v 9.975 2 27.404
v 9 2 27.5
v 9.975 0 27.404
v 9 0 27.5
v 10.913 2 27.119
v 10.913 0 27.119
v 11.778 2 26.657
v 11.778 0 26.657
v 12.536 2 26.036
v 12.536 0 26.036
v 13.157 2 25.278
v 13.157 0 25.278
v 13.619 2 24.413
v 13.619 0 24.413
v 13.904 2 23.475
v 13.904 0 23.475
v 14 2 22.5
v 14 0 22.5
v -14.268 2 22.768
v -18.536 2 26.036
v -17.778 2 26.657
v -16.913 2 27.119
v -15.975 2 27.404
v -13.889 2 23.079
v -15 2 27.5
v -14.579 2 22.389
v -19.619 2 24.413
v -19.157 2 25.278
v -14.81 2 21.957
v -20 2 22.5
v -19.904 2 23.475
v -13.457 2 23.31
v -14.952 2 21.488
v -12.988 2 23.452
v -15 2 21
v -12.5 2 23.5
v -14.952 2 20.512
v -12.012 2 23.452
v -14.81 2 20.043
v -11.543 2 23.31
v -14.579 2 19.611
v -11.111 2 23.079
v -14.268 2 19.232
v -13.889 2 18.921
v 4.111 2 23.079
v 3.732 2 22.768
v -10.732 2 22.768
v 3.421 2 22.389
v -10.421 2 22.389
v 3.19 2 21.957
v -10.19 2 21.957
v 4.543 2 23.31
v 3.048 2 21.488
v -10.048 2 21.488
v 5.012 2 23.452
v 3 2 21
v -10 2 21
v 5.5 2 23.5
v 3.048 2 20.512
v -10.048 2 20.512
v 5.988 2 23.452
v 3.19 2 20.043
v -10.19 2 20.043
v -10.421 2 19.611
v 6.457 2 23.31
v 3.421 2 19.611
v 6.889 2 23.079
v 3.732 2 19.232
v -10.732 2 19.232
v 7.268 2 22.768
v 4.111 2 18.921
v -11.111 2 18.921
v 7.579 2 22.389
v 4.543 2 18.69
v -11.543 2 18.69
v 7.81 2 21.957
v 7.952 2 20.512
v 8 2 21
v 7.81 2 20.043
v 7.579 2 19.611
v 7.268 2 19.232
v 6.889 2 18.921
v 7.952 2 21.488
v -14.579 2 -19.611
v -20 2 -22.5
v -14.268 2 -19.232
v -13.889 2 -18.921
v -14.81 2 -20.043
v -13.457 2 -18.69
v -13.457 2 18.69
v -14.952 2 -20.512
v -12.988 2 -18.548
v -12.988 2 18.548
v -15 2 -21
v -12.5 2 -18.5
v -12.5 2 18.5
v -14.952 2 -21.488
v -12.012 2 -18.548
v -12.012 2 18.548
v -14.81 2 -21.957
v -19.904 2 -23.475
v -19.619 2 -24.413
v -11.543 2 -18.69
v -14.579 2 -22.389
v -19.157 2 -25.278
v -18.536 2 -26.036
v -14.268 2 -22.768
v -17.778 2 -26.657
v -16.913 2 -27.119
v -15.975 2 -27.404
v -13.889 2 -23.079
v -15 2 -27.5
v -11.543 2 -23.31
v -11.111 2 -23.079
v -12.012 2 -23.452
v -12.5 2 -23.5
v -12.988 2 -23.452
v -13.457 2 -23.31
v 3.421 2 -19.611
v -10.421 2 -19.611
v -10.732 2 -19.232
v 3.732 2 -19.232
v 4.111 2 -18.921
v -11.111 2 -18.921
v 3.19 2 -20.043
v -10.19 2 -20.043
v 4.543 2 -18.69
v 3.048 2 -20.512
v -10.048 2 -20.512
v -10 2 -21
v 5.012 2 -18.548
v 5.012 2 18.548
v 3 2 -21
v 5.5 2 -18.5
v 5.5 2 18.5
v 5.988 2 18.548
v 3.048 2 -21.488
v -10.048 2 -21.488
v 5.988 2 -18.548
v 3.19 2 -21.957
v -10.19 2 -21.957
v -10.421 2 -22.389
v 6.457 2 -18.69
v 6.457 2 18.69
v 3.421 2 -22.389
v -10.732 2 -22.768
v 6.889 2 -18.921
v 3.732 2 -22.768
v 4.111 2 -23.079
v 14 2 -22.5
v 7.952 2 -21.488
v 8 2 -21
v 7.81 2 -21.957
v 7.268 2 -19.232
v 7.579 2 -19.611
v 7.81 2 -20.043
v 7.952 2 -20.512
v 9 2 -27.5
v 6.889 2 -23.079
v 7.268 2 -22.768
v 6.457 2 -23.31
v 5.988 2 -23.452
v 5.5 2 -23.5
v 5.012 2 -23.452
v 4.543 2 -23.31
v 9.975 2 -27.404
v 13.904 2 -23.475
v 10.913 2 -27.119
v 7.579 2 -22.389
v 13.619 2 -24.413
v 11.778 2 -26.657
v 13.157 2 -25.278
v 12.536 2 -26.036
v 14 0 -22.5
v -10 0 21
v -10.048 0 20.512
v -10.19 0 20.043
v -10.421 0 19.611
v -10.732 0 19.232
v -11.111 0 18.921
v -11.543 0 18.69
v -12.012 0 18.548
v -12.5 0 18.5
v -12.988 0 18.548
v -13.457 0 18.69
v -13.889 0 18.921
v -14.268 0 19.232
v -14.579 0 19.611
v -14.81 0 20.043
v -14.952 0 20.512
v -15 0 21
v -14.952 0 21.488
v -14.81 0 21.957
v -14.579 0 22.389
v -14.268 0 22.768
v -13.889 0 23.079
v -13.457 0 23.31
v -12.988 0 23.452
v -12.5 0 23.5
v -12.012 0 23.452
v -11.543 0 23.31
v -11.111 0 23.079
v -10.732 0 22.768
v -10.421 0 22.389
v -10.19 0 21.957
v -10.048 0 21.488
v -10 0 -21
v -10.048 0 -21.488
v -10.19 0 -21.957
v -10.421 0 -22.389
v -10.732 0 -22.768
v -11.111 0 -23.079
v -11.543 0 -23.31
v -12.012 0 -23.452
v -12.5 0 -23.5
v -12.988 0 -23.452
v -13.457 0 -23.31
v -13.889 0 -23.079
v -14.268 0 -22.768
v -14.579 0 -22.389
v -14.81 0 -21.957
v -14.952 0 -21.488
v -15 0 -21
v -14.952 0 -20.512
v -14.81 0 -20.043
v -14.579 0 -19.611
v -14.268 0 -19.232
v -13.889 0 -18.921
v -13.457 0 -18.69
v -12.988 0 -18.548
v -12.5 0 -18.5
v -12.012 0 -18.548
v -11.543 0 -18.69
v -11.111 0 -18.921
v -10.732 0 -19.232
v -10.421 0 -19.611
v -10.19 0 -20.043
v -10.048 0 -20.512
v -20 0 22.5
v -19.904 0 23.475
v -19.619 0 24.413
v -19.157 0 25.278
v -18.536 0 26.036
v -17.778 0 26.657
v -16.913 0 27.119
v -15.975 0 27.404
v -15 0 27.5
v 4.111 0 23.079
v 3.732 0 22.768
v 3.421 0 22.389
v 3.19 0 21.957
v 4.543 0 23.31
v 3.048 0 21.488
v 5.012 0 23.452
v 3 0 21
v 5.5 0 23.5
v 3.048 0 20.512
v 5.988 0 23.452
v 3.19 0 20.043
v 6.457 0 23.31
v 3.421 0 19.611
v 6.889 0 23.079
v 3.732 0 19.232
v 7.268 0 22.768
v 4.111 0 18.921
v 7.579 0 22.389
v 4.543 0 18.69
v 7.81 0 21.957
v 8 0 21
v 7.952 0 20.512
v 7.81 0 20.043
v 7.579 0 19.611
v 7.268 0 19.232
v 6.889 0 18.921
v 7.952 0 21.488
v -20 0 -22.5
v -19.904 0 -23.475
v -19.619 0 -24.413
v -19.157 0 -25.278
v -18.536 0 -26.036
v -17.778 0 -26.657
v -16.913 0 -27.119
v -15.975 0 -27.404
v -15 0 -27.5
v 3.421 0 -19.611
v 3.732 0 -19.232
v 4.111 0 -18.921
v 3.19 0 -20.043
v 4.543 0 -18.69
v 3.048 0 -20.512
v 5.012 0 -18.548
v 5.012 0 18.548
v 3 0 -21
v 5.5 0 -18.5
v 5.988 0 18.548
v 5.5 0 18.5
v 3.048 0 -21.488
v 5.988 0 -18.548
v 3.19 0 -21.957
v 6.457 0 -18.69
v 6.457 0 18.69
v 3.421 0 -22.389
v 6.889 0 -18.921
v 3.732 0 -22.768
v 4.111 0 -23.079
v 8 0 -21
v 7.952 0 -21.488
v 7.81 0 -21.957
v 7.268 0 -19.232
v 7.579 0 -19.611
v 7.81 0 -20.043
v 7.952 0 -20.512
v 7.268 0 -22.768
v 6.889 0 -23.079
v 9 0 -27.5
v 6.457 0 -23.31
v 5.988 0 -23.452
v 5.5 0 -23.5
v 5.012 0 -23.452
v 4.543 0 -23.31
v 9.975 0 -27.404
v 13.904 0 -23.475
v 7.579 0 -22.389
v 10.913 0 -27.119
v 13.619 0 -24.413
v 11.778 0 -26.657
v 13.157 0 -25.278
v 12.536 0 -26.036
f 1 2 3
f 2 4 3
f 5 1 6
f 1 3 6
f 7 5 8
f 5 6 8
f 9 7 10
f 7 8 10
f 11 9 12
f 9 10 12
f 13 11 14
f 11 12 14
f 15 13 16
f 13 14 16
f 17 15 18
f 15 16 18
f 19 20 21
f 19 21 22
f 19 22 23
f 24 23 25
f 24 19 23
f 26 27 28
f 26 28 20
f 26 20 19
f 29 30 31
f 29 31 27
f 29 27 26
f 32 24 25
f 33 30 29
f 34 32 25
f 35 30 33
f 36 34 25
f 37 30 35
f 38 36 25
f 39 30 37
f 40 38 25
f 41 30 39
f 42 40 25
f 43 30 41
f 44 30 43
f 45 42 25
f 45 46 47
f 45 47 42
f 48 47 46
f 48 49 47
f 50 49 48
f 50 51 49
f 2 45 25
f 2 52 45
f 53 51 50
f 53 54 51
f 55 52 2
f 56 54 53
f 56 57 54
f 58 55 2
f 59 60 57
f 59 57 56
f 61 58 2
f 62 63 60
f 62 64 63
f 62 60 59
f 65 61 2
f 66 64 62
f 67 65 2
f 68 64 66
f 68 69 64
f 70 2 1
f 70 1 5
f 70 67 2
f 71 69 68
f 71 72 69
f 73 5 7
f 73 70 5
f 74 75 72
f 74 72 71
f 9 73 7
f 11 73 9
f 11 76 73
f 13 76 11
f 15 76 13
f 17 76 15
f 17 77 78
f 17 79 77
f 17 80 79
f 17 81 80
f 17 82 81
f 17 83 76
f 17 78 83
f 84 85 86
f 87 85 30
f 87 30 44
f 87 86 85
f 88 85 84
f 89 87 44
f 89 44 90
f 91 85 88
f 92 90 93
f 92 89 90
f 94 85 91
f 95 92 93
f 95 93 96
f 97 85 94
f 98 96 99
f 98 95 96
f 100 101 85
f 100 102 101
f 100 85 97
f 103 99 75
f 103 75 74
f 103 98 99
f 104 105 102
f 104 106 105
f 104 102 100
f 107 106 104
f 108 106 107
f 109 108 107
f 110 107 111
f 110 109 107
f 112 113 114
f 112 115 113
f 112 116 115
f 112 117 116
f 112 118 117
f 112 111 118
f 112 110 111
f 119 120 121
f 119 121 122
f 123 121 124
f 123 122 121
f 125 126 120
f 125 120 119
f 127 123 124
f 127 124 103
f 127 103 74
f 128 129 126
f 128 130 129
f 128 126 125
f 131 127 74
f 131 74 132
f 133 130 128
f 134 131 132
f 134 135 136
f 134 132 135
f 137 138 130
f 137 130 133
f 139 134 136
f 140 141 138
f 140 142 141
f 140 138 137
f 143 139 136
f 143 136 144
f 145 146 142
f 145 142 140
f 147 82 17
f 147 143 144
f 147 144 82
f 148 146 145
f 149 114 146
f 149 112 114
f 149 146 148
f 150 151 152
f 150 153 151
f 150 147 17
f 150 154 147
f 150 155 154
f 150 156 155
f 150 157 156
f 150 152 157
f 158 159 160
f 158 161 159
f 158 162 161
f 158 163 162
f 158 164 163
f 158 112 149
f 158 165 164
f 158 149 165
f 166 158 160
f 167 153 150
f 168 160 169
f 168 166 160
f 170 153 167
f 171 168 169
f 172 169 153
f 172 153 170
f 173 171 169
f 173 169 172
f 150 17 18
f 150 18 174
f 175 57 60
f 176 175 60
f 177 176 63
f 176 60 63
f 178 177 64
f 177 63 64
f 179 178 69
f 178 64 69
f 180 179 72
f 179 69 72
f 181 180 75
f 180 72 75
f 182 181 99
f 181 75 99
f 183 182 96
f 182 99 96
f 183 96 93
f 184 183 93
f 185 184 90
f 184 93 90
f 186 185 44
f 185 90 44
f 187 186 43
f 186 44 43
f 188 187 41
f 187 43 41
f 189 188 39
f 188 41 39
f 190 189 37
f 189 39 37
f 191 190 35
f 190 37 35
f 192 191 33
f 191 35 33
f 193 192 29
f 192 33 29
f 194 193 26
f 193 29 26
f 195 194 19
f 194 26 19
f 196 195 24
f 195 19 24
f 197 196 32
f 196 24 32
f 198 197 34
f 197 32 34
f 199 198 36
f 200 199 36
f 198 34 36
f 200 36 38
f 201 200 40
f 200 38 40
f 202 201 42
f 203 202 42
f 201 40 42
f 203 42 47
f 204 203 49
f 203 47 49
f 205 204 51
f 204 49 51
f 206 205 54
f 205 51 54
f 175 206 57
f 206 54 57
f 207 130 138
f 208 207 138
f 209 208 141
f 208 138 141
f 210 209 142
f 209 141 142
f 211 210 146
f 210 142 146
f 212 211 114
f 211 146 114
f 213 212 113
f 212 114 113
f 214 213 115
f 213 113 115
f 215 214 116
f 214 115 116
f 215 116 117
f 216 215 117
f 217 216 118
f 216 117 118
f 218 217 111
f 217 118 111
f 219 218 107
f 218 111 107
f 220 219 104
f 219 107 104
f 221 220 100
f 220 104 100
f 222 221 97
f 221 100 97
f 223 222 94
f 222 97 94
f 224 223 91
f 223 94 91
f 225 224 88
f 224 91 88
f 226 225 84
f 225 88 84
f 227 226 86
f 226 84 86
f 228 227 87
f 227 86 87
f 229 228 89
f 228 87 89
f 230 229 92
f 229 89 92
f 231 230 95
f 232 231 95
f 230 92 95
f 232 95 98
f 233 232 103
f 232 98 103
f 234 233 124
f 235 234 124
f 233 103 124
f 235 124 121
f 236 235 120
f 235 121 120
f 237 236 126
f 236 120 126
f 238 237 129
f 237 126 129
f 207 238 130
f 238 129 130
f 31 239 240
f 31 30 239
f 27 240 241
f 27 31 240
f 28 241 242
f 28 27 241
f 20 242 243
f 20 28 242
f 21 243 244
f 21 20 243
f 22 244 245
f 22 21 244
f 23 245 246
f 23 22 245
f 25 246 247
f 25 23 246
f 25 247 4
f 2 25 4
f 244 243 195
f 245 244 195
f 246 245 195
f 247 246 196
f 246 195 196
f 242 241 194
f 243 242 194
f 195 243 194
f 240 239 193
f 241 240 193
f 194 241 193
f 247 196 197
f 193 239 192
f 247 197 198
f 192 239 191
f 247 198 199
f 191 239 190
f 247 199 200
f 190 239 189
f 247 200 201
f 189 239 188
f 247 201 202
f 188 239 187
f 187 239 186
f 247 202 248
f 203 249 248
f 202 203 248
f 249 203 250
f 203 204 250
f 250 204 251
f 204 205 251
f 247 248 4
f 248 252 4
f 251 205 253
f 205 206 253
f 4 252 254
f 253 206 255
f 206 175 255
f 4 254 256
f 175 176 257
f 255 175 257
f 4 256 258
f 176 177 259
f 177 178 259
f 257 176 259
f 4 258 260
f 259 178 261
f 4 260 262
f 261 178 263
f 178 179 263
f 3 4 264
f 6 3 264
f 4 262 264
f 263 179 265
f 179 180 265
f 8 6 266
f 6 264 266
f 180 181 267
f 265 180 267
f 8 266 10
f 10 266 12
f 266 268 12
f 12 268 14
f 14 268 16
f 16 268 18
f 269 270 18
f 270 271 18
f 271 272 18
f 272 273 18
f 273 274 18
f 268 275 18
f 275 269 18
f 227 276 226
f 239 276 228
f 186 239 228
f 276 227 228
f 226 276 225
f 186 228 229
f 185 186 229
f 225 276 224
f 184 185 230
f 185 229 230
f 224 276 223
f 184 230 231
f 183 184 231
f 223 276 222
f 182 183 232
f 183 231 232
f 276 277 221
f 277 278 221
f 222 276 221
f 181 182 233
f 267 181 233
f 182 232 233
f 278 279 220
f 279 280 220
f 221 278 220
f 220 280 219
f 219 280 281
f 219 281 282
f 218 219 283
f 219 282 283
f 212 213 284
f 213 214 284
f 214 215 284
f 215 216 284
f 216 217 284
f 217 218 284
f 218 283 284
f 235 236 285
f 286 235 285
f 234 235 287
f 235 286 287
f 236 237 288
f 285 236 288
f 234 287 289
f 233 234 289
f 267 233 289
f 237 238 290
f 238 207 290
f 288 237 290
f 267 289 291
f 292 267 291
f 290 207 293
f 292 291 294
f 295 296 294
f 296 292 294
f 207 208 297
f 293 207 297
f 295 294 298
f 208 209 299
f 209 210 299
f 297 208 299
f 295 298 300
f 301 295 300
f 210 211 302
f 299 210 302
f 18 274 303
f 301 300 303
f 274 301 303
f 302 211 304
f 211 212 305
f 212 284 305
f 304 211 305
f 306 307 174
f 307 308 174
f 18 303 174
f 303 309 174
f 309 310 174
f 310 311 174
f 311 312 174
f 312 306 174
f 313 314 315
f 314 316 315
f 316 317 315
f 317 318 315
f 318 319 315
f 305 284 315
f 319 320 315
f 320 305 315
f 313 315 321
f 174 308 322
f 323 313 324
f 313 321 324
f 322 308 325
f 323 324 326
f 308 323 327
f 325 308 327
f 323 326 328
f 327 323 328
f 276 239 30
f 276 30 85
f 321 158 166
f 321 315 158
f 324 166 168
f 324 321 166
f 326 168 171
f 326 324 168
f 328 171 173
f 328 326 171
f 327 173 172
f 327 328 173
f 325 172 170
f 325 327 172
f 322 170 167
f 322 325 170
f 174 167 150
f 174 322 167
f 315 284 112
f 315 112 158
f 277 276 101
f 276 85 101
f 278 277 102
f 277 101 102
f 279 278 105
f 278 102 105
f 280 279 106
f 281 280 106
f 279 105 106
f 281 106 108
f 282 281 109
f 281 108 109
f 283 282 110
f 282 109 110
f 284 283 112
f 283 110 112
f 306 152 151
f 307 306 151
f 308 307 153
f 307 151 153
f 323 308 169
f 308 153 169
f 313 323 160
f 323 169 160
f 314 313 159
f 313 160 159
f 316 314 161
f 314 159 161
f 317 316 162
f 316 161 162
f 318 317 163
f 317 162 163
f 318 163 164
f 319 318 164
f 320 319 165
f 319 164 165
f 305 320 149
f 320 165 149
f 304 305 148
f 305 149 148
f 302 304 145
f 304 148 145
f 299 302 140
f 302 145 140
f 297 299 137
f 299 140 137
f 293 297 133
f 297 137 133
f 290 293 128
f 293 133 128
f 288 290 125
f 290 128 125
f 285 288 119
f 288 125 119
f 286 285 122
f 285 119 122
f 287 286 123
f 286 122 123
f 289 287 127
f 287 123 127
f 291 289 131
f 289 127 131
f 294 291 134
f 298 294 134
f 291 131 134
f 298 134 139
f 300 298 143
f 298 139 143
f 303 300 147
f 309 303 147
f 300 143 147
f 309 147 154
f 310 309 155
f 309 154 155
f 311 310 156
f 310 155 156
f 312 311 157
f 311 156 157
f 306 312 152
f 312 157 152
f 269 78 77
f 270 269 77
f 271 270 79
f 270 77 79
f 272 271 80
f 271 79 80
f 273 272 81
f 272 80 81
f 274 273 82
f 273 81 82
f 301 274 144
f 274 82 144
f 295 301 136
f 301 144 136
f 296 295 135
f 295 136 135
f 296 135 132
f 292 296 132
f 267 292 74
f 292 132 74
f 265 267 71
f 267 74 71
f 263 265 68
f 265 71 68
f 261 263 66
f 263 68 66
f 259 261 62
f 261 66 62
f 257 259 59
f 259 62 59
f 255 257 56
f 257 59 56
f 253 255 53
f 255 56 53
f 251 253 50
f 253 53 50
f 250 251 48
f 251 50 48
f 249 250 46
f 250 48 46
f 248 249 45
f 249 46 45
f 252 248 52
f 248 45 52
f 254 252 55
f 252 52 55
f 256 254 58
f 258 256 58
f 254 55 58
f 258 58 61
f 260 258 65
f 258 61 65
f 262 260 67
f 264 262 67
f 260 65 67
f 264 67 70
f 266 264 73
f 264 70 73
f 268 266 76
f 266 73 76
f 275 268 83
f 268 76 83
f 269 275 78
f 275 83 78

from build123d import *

# Parameters (mm, degrees)
SKETCH1_W           = 40
SKETCH1_H           = 55
BOSS_EXTRUDE1_DEPTH = 2
SKETCH3_R           = 2.5
CUT_EXTRUDE1_DEPTH  = 2
SKETCH4_W           = 6
SKETCH4_H           = 55
CUT_EXTRUDE2_DEPTH  = 2
FILLET1_R           = 5


with BuildPart() as part:
    # Sketch1 → Boss-Extrude1 (new body)
    with BuildSketch(Plane(origin=(0, 0, 0), x_dir=(1, 0, 0), z_dir=(0, 1, 0))):
        Rectangle(SKETCH1_W, SKETCH1_H)
    extrude(amount=BOSS_EXTRUDE1_DEPTH)

    # Sketch3 → Cut-Extrude1 (cut)
    with BuildSketch(Plane(origin=(0, 2, 0), x_dir=(1, 0, 0), z_dir=(0, 1, 0))):
        with Locations((-12.5, 21)):
            Circle(SKETCH3_R)
        with Locations((-12.5, -21)):
            Circle(SKETCH3_R)
        with Locations((5.5, 21)):
            Circle(SKETCH3_R)
        with Locations((5.5, -21)):
            Circle(SKETCH3_R)
    extrude(amount=-CUT_EXTRUDE1_DEPTH, mode=Mode.SUBTRACT)

    # Sketch4 → Cut-Extrude2 (cut)
    with BuildSketch(Plane(origin=(0, 2, 0), x_dir=(1, 0, 0), z_dir=(0, 1, 0))):
        with Locations((17, 0)):
            Rectangle(SKETCH4_W, SKETCH4_H)
    extrude(amount=-CUT_EXTRUDE2_DEPTH, mode=Mode.SUBTRACT)

    # Fillet1
    fillet1_edges = [part.edges().sort_by_distance(p)[0] for p in [
        (14, 1, 27.5),
        (14, 1, -27.5),
        (-20, 1, -27.5),
        (-20, 1, 27.5),
    ]]
    fillet(fillet1_edges, radius=FILLET1_R)


solid = part.part
